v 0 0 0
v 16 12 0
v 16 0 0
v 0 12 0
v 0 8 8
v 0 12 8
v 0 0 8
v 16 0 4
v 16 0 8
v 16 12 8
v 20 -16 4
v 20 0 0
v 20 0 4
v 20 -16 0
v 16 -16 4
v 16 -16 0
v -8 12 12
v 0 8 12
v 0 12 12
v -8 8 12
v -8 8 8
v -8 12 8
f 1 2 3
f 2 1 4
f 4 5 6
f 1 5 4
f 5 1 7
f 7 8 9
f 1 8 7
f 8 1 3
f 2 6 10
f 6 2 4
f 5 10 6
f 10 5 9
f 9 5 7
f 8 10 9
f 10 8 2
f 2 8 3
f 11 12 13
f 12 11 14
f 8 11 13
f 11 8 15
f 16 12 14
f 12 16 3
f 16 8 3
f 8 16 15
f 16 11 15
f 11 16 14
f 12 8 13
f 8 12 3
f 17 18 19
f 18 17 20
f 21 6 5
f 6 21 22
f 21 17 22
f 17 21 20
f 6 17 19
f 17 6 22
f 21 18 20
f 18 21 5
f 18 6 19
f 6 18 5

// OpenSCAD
// file: cubec11.scad
module cubec11(L=4)
{

COR1=0.0;
translate([0,0,0]) color([COR1,COR1,0.4]) cube(L);
translate([L,0,0]) color([COR1,COR1,0.8]) cube(L);
}
// file: cube1a1.scad
module cube1a1(L=4)
{


COR1=0.0;
translate([0,  0,0]) color([0.4,COR1,COR1]) cube(L);

COR2=0.25;
translate([0,  L,0]) color([0.4,COR2,COR2]) cube(L);

COR3=0.5;
translate([0, 2*L,0]) color([0.4,COR3,COR3]) cube(L);


COR4=0.75;
translate([0, 3*L,0]) color([0.4,COR4,COR4]) cube(L);
}
// file: cubeabc.scad
module cubeabc(L=4)
{

COR1=0.0;
translate([0,  0,0]) color([0.4,COR1,COR1]) cube(L);
translate([0,  L,0]) color([COR1,0.4,COR1]) cube(L);
translate([0,2*L,0]) color([COR1,COR1,0.4]) cube(L);
translate([0,  0,L]) color([0.8,COR1,COR1]) cube(L);
translate([0,  L,L]) color([COR1,0.8,COR1]) cube(L);
translate([0,2*L,L]) color([COR1,COR1,0.8]) cube(L);

COR2=0.25;
translate([L,  0,0]) color([0.4,COR2,COR2]) cube(L);
translate([L,  L,0]) color([COR2,0.4,COR2]) cube(L);
translate([L,2*L,0]) color([COR2,COR2,0.4]) cube(L);
translate([L,  0,L]) color([0.8,COR2,COR2]) cube(L);
translate([L,  L,L]) color([COR2,0.8,COR2]) cube(L);
translate([L,2*L,L]) color([COR2,COR2,0.8]) cube(L);

COR3=0.5;
translate([2*L,  0,0]) color([0.4,COR3,COR3]) cube(L);
translate([2*L,  L,0]) color([COR3,0.4,COR3]) cube(L);
translate([2*L,2*L,0]) color([COR3,COR3,0.4]) cube(L);
translate([2*L,  0,L]) color([0.8,COR3,COR3]) cube(L);
translate([2*L,  L,L]) color([COR3,0.8,COR3]) cube(L);
translate([2*L,2*L,L]) color([COR3,COR3,0.8]) cube(L);


COR4=0.75;
translate([3*L,  0,0]) color([0.4,COR4,COR4]) cube(L);
translate([3*L,  L,0]) color([COR4,0.4,COR4]) cube(L);
translate([3*L,2*L,0]) color([COR4,COR4,0.4]) cube(L);
translate([3*L,  0,L]) color([0.8,COR4,COR4]) cube(L);
translate([3*L,  L,L]) color([COR4,0.8,COR4]) cube(L);
translate([3*L,2*L,L]) color([COR4,COR4,0.8]) cube(L);
}
// main file
include <cubeabc.scad> 
include <cube1a1.scad> 
include <cubec11.scad> 
A=4;
translate([    0,   0,  0]) cubeabc(L=A);
translate([  4*A,-4*A,  0]) cube1a1(L=A);
translate([ -2*A, 2*A,2*A]) cubec11(L=A);
